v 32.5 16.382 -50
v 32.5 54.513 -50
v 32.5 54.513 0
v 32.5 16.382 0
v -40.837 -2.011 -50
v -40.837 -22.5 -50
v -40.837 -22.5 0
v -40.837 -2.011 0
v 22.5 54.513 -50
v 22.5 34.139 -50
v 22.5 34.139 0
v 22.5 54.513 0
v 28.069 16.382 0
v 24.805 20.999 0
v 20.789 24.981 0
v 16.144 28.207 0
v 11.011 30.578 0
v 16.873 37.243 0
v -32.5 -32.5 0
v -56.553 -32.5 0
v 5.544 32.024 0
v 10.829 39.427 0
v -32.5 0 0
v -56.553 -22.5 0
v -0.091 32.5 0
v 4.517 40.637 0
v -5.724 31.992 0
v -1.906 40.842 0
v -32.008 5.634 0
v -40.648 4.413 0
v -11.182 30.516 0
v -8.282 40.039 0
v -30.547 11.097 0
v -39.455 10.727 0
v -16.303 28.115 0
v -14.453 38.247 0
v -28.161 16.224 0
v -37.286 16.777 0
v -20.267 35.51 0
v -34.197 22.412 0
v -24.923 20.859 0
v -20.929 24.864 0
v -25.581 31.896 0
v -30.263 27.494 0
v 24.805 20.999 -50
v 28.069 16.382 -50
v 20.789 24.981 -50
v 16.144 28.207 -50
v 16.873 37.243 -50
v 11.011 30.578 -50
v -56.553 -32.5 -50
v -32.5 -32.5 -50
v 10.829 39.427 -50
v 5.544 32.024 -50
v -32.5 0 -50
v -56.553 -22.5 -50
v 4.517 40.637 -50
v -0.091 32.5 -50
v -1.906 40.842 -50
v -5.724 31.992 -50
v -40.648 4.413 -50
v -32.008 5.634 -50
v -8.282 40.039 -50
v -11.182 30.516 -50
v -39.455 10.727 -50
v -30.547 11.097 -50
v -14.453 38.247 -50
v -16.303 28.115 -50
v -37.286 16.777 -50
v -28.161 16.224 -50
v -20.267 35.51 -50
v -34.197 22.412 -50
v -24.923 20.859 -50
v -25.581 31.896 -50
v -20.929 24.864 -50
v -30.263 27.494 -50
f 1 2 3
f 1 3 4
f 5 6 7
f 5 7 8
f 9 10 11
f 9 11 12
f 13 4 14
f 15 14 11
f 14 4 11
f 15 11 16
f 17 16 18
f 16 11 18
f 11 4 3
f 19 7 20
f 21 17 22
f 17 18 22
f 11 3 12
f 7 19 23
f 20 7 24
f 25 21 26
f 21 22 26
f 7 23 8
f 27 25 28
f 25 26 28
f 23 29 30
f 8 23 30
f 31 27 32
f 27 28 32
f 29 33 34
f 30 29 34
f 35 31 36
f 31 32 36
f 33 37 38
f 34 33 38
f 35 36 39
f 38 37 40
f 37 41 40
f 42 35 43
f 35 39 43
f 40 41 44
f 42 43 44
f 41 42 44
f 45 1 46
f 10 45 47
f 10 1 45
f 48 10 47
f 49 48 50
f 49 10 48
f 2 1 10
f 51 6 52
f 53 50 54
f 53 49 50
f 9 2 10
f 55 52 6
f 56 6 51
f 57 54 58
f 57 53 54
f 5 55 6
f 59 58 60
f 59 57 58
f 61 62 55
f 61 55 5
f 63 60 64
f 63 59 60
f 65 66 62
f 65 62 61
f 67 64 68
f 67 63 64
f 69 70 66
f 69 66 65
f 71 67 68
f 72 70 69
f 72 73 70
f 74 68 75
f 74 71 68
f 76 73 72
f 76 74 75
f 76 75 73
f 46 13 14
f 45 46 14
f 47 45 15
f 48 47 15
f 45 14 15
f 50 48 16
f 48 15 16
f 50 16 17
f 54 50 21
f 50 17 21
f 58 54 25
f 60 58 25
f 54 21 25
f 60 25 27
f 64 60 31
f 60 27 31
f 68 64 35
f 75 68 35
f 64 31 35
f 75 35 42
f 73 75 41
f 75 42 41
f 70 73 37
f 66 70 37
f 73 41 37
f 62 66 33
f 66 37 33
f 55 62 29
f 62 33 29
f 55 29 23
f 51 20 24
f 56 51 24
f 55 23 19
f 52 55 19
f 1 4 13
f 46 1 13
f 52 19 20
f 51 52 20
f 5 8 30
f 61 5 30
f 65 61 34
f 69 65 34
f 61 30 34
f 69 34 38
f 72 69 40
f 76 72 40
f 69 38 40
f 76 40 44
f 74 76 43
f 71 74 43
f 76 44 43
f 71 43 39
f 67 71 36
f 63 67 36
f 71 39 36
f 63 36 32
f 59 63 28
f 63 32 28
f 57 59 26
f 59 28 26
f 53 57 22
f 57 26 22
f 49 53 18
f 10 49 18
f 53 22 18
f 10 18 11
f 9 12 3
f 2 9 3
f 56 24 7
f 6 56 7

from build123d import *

# Parameters (mm, degrees)
BOSS_EXTRUDE1_DEPTH = 50


with BuildPart() as part:
    # Sketch2 → Boss-Extrude1 (new body)
    with BuildSketch(Plane.XY):
        with BuildLine():
            Line((-32.5, 0), (-32.5, -32.5))
            Line((-32.5, -32.5), (-56.553245639, -32.5))
            Line((-56.553245639, -32.5), (-56.553245639, -22.5))
            Line((-56.553245639, -22.5), (-40.8373789, -22.5))
            Line((-40.8373789, -22.5), (-40.8373789, -2.010804855))
            ThreePointArc((-40.8373789, -2.010804855), (-20.267475074, 35.510059219), (22.5, 34.139198169))
            Line((22.5, 34.139198169), (22.5, 54.513252466))
            Line((22.5, 54.513252466), (32.5, 54.513252466))
            Line((32.5, 54.513252466), (32.5, 16.381694729))
            Line((32.5, 16.381694729), (28.069379719, 16.381694729))
            ThreePointArc((28.069379719, 16.381694729), (-8.485138748, 31.372797459), (-32.5, 0))
        make_face()
    extrude(amount=-BOSS_EXTRUDE1_DEPTH)


solid = part.part
